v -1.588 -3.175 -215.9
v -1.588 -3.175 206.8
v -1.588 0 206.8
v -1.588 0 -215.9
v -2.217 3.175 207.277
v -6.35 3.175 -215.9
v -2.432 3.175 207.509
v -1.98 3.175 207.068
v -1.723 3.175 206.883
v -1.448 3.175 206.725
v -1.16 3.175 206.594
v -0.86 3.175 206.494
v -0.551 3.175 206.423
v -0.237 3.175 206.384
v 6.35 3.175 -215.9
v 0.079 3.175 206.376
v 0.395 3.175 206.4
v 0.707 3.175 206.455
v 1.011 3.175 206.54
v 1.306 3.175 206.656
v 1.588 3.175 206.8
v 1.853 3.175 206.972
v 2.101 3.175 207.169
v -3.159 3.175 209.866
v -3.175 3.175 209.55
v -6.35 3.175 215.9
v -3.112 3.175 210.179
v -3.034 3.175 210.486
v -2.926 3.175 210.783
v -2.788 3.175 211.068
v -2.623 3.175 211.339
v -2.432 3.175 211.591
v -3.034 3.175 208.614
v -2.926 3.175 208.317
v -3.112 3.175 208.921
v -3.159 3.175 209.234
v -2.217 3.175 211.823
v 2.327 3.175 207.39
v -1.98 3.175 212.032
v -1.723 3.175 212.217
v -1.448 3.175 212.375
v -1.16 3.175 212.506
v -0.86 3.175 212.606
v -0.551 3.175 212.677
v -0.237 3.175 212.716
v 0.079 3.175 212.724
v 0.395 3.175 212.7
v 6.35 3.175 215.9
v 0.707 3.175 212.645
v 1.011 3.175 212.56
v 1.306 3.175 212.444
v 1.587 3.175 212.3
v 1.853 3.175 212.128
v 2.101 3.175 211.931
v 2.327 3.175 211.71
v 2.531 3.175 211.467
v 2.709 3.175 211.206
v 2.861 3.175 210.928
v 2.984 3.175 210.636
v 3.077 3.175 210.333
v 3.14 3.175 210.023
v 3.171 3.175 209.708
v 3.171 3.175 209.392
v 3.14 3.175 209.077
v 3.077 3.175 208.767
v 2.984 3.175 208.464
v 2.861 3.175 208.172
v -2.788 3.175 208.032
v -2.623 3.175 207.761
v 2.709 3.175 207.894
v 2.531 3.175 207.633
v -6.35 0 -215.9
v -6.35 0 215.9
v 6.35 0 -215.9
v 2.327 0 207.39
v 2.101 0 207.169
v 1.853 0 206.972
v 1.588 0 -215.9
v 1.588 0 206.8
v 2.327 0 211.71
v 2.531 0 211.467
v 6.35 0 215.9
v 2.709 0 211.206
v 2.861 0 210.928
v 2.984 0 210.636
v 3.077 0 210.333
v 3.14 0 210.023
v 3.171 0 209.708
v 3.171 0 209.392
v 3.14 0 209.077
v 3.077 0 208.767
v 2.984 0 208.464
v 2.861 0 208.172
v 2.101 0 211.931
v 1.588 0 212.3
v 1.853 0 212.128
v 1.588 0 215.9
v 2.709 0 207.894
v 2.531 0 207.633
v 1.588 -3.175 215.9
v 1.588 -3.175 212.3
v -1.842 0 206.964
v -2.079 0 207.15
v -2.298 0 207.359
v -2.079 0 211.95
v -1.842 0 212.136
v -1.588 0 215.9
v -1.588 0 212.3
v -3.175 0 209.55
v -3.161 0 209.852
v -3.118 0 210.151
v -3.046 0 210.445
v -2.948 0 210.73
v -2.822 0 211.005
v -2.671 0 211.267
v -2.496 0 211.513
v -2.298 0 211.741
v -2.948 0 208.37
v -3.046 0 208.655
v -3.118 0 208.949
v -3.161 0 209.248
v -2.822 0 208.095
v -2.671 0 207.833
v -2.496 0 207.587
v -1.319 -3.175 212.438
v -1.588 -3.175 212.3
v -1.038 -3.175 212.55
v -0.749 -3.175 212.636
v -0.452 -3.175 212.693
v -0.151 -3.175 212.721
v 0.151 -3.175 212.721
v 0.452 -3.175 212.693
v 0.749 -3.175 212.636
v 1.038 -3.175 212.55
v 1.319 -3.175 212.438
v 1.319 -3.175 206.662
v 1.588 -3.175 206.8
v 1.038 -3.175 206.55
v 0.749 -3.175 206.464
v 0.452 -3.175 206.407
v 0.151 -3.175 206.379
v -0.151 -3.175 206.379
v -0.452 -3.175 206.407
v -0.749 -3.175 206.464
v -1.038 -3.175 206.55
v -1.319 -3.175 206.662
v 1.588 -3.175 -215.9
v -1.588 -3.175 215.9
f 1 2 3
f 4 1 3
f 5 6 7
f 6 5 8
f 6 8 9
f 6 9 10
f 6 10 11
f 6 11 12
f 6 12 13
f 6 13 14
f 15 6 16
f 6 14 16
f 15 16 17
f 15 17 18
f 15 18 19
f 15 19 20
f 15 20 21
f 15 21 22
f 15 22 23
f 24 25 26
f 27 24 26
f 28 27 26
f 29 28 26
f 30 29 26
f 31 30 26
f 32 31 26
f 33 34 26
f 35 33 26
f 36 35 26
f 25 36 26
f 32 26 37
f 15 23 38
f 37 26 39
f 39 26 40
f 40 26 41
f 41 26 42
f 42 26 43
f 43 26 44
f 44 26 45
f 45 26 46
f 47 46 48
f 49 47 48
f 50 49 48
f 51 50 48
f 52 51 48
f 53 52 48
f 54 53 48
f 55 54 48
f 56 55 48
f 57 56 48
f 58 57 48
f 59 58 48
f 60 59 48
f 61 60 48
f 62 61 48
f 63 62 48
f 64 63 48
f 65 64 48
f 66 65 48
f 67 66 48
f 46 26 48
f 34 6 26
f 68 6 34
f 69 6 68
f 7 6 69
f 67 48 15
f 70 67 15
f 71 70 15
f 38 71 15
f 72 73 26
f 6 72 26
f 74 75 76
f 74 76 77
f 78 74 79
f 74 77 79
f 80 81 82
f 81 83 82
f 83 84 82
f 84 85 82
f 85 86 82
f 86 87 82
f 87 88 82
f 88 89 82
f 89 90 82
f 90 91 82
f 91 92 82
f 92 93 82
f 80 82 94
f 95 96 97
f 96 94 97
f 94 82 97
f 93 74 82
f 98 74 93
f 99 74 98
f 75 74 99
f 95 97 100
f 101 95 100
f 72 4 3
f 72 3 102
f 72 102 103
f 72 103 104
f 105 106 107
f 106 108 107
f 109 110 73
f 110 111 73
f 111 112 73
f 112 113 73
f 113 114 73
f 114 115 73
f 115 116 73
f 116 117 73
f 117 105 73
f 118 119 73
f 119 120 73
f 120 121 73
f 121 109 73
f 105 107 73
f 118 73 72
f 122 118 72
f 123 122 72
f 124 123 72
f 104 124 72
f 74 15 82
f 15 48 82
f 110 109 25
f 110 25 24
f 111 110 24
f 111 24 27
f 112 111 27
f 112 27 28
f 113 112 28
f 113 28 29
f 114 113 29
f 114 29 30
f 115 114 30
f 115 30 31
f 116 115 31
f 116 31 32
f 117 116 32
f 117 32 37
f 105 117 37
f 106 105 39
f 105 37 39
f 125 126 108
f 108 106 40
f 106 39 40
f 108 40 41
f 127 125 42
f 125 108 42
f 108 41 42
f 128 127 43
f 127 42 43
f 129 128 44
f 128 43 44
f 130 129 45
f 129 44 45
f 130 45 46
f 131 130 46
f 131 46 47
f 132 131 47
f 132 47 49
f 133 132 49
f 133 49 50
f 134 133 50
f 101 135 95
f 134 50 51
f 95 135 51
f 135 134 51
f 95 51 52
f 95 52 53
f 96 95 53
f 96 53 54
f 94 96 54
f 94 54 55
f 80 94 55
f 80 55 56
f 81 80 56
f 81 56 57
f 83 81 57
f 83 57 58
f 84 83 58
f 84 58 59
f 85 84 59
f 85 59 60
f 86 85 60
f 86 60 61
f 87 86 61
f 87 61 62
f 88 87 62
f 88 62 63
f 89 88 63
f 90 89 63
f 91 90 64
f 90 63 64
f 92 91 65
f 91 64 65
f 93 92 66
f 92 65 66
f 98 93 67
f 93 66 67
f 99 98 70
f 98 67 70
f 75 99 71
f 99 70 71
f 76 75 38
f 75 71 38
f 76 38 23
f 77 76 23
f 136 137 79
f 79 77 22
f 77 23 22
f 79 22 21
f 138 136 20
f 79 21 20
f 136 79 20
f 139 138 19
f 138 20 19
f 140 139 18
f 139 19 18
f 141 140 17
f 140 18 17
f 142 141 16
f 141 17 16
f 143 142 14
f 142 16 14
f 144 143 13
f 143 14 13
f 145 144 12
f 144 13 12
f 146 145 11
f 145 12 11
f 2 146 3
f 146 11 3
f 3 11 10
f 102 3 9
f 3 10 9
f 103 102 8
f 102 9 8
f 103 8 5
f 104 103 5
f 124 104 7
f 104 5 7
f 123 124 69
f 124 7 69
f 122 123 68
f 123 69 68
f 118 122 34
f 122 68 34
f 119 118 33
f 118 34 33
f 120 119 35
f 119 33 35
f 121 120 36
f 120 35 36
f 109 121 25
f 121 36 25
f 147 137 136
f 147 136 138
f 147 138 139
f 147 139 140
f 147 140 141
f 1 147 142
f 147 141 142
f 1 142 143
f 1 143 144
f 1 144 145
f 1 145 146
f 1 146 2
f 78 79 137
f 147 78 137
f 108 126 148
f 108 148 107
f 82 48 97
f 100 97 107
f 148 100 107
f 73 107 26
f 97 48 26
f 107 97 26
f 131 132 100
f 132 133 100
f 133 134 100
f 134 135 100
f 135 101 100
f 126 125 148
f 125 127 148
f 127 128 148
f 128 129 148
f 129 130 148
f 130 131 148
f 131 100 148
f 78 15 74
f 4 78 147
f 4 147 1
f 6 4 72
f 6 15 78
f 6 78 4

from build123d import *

# Parameters (mm, degrees)
BOSS_EXTRUDE1_DEPTH = 215.9
SKETCH4_R           = 3.175
CUT_EXTRUDE1_DEPTH  = 217.086683995


with BuildPart() as part:
    # Sketch3 → Boss-Extrude1 (new, symmetric)
    with BuildSketch(Plane.XY):
        Polygon((-6.35, 3.175), (6.35, 3.175), (6.35, 0), (1.5875, 0), (1.5875, -3.175), (-1.5875, -3.175), (-1.5875, 0), (-6.35, 0), align=None)
    extrude(amount=BOSS_EXTRUDE1_DEPTH, both=True)

    # Sketch4 → Cut-Extrude1 (cut, through all)
    with BuildSketch(Plane(origin=(0, 3.175, 0), x_dir=(1, 0, 0), z_dir=(0, 1, 0))):
        with Locations(Location((0, -209.55, 0), (0, 0, 180))):
            Circle(SKETCH4_R)
    extrude(amount=-CUT_EXTRUDE1_DEPTH, mode=Mode.SUBTRACT)


solid = part.part
